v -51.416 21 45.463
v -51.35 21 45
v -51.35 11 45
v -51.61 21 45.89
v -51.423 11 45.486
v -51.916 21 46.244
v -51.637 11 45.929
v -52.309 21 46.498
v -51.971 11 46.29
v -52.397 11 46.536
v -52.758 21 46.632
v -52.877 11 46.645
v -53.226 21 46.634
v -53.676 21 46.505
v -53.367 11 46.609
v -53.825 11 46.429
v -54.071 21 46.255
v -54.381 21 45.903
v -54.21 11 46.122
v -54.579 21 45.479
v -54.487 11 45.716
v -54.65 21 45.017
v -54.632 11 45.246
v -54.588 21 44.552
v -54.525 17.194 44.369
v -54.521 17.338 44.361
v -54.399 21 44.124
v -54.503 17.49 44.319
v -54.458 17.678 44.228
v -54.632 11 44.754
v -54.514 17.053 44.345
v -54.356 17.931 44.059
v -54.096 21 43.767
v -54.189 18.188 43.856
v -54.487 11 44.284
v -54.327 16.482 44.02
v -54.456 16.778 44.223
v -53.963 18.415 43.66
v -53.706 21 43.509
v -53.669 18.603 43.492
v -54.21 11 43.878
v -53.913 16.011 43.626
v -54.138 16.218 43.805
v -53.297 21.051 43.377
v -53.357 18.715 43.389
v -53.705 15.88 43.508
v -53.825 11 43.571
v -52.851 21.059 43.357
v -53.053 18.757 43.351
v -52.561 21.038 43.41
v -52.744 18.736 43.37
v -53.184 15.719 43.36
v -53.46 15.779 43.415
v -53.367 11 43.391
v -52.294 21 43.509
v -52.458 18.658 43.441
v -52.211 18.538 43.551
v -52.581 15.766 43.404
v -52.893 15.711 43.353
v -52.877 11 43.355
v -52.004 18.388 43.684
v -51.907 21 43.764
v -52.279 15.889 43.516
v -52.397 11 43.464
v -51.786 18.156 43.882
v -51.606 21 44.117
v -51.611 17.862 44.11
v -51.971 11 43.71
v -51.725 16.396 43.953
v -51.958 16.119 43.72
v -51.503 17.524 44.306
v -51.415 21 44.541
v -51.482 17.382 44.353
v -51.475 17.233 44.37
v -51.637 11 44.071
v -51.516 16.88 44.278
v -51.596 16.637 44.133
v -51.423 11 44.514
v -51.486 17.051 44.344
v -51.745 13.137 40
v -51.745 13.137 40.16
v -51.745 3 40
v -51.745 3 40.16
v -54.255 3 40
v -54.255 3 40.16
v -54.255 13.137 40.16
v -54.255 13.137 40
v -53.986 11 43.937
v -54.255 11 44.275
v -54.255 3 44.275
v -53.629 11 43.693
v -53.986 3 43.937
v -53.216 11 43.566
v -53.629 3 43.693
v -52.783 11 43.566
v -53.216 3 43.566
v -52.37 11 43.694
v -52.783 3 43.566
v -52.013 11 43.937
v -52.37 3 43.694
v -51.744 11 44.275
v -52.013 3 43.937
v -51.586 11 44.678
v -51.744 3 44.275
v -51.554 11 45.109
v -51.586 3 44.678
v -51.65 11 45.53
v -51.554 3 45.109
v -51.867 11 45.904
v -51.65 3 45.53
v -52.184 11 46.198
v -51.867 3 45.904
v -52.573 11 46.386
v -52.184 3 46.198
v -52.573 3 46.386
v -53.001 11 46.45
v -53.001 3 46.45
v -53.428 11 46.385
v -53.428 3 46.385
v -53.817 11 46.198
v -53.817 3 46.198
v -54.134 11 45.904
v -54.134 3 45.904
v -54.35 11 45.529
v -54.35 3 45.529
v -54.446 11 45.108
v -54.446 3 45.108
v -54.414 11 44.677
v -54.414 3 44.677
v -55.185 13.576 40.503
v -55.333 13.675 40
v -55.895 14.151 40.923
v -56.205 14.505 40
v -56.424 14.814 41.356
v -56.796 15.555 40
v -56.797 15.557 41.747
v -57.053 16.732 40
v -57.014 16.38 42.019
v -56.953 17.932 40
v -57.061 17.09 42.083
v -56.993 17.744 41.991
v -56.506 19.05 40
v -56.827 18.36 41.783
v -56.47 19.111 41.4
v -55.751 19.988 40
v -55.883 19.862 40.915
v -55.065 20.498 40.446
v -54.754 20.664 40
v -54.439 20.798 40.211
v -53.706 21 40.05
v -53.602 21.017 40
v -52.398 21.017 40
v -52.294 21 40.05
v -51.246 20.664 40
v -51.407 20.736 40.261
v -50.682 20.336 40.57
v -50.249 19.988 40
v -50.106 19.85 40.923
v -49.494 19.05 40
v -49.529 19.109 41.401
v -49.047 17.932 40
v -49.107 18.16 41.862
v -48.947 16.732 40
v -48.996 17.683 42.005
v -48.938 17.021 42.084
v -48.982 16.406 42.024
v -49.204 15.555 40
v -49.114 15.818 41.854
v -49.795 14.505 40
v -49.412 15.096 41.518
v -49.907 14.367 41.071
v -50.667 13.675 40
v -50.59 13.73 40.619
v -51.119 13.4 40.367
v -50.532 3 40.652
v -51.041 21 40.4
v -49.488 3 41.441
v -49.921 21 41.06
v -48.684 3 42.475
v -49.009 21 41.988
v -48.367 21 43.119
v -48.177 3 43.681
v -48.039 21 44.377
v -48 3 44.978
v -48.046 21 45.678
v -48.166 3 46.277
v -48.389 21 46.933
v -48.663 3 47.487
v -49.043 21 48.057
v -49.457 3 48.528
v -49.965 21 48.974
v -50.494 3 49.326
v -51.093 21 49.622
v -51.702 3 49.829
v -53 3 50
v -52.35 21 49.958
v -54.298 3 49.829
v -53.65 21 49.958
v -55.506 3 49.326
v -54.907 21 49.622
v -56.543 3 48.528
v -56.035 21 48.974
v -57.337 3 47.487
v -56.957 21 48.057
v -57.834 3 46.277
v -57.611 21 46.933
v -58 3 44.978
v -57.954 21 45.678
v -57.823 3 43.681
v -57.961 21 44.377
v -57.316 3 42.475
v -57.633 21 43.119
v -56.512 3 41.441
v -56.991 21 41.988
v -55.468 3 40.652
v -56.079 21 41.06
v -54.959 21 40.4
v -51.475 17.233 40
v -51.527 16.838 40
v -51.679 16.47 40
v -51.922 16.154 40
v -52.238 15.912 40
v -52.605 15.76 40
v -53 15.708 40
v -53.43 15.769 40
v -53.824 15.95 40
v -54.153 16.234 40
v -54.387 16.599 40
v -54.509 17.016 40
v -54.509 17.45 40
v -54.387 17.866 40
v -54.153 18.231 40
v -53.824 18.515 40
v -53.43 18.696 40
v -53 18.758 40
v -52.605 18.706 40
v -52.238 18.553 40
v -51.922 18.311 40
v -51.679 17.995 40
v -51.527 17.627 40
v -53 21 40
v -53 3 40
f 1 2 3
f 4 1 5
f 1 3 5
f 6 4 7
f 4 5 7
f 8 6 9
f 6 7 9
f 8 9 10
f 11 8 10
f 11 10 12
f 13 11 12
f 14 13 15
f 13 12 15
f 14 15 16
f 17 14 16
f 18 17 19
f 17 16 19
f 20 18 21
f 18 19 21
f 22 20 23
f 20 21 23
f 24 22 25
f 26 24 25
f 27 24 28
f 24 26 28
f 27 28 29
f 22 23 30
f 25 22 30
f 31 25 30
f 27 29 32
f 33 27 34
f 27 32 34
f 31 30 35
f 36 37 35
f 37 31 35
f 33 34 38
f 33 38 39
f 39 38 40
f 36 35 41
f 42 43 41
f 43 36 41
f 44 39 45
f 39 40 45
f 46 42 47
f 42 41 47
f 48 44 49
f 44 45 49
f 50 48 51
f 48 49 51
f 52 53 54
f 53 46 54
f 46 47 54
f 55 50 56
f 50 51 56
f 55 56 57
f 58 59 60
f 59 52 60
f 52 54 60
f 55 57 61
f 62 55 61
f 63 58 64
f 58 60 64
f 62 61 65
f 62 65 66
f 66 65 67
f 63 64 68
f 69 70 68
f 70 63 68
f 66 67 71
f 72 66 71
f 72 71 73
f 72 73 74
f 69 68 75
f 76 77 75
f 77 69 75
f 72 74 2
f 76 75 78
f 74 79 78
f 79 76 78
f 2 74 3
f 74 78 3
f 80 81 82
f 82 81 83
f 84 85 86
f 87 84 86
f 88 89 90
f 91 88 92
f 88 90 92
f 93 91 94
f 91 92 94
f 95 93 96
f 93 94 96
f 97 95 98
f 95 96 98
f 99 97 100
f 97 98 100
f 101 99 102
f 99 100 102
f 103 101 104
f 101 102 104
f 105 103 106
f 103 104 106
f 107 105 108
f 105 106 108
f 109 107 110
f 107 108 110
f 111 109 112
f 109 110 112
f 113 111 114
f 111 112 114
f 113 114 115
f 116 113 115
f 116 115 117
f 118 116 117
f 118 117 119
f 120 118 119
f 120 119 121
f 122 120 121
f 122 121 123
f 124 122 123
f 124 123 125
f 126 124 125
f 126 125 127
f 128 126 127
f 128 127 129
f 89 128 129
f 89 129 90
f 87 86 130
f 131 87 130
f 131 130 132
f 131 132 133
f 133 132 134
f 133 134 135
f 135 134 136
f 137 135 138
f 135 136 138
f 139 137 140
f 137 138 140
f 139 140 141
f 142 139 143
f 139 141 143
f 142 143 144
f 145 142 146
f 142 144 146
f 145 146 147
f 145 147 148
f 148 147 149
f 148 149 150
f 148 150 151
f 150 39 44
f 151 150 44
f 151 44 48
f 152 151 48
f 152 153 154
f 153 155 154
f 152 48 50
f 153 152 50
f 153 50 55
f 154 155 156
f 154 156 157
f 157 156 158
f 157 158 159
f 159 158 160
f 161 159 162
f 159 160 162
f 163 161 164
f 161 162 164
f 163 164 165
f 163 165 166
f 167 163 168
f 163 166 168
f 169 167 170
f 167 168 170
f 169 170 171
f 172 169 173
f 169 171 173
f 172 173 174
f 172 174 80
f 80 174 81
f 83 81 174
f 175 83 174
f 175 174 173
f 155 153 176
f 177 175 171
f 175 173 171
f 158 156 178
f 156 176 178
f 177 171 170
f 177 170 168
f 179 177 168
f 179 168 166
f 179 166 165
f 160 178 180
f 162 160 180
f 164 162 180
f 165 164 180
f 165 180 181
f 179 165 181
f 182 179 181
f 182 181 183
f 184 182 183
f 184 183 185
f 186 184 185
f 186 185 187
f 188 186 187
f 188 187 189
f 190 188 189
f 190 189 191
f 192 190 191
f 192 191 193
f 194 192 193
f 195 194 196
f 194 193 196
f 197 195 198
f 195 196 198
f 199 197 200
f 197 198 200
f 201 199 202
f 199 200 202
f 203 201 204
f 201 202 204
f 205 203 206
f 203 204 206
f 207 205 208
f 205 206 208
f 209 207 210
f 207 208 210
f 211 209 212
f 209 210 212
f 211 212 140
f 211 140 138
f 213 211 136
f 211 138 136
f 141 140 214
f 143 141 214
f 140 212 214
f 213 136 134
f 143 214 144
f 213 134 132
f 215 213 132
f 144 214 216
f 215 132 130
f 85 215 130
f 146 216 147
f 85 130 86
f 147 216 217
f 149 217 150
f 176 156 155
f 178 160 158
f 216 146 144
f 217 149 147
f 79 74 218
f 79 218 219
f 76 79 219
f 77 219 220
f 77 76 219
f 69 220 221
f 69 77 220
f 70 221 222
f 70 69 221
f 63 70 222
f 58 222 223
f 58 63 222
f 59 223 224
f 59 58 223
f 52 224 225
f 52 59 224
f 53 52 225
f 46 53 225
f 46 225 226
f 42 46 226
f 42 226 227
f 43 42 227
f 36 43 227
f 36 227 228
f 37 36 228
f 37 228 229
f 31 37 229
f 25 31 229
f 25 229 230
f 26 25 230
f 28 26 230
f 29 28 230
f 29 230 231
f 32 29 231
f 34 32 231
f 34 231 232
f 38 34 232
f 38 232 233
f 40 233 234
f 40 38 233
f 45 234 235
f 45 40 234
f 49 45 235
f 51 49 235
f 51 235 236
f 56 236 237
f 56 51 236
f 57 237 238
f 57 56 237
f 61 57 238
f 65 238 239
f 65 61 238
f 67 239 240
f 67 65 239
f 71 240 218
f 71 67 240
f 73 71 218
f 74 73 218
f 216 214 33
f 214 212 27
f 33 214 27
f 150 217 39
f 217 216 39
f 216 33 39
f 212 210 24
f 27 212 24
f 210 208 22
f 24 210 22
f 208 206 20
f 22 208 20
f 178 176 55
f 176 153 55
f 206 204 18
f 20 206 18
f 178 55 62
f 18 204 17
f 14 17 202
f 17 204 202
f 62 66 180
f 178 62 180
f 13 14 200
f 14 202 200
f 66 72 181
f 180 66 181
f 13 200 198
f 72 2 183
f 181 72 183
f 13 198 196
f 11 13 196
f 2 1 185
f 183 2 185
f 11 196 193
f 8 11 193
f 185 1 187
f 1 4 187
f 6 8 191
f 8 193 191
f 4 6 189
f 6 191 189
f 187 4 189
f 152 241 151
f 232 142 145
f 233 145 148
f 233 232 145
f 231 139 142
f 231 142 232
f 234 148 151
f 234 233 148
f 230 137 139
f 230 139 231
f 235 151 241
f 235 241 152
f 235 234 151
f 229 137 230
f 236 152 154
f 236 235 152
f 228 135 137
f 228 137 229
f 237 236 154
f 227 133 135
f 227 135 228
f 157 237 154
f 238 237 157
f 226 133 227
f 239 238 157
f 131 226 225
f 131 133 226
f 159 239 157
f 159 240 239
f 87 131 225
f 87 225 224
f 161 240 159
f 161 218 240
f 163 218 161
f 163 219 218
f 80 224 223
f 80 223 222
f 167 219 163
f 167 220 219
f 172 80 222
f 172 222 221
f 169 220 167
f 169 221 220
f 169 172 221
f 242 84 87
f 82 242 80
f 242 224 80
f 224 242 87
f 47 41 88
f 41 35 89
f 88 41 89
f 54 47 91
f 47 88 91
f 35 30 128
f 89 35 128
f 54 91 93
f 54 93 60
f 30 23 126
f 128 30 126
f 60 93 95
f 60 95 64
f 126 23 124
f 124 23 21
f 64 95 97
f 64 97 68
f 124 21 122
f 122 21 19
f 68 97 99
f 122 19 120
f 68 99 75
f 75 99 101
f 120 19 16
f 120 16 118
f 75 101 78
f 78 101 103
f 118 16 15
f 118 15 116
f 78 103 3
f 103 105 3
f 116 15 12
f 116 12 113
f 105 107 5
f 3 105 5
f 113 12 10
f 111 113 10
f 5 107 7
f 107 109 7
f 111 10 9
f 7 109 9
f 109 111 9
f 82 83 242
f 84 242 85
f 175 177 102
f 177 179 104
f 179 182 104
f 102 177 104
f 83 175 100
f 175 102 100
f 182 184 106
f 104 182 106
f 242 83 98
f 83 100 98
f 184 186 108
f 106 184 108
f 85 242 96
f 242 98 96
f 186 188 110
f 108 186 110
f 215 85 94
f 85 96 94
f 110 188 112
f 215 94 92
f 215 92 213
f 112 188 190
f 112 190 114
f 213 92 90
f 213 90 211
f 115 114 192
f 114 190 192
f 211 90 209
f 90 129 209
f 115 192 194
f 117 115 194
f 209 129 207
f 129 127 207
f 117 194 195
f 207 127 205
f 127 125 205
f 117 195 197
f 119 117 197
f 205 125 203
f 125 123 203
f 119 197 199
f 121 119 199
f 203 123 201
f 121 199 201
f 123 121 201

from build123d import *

# Parameters (mm, degrees)
PAD059_DEPTH            = 5
SKETCH256_R             = 1.525
POCKET023_DEPTH         = 5.001
SKETCH254_R             = 1.65
POCKET024_DEPTH         = 10.062801
SKETCH258_R             = 1.45
POCKET025_DEPTH         = 8
BODY018_PLACEMENT_ANGLE = 90


with BuildPart() as part:
    # Sketch255 → Revolution006 (revolve)
    with BuildSketch(Plane.XZ):
        Polygon((1.65, -18), (1.65, -8), (1.45, -8), (1.45, 0), (5, 0), (5, -18), align=None)
    revolve(axis=Axis((0, 0, 0), (0, 0, 1)))

    # Sketch257 → Pad059 (new body)
    with BuildSketch(Plane.XZ):
        with BuildLine():
            ThreePointArc((-1.255464, -10.137095), (0, -18.061801), (1.255464, -10.137095))
            Line((1.255464, -10.137095), (1.255464, 0))
            Line((1.255464, 0), (-1.255464, 0))
            Line((-1.255464, 0), (-1.255464, -10.137095))
        make_face()
    extrude(amount=PAD059_DEPTH)

    # Sketch256 → Pocket023 (cut, through all)
    with BuildSketch(Plane.XZ):
        with Locations((0, -14.232587)):
            Circle(SKETCH256_R)
    extrude(amount=POCKET023_DEPTH, mode=Mode.SUBTRACT)

    # Sketch254 → Pocket024 (cut, through all)
    with BuildSketch(Plane.XY.offset(-8)):
        Circle(SKETCH254_R)
    extrude(amount=-POCKET024_DEPTH, mode=Mode.SUBTRACT)

    # Sketch258 → Pocket025 (cut)
    with BuildSketch(Plane.XY):
        Circle(SKETCH258_R)
    extrude(amount=-POCKET025_DEPTH, mode=Mode.SUBTRACT)


with BuildPart() as part_1:
    # Body018 placement: moved
    add(part.part.moved(Location((-53, 3, 45))).rotate(Axis((-53, 3, 45), (1, 0, 0)), BODY018_PLACEMENT_ANGLE))


solid = part_1.part
